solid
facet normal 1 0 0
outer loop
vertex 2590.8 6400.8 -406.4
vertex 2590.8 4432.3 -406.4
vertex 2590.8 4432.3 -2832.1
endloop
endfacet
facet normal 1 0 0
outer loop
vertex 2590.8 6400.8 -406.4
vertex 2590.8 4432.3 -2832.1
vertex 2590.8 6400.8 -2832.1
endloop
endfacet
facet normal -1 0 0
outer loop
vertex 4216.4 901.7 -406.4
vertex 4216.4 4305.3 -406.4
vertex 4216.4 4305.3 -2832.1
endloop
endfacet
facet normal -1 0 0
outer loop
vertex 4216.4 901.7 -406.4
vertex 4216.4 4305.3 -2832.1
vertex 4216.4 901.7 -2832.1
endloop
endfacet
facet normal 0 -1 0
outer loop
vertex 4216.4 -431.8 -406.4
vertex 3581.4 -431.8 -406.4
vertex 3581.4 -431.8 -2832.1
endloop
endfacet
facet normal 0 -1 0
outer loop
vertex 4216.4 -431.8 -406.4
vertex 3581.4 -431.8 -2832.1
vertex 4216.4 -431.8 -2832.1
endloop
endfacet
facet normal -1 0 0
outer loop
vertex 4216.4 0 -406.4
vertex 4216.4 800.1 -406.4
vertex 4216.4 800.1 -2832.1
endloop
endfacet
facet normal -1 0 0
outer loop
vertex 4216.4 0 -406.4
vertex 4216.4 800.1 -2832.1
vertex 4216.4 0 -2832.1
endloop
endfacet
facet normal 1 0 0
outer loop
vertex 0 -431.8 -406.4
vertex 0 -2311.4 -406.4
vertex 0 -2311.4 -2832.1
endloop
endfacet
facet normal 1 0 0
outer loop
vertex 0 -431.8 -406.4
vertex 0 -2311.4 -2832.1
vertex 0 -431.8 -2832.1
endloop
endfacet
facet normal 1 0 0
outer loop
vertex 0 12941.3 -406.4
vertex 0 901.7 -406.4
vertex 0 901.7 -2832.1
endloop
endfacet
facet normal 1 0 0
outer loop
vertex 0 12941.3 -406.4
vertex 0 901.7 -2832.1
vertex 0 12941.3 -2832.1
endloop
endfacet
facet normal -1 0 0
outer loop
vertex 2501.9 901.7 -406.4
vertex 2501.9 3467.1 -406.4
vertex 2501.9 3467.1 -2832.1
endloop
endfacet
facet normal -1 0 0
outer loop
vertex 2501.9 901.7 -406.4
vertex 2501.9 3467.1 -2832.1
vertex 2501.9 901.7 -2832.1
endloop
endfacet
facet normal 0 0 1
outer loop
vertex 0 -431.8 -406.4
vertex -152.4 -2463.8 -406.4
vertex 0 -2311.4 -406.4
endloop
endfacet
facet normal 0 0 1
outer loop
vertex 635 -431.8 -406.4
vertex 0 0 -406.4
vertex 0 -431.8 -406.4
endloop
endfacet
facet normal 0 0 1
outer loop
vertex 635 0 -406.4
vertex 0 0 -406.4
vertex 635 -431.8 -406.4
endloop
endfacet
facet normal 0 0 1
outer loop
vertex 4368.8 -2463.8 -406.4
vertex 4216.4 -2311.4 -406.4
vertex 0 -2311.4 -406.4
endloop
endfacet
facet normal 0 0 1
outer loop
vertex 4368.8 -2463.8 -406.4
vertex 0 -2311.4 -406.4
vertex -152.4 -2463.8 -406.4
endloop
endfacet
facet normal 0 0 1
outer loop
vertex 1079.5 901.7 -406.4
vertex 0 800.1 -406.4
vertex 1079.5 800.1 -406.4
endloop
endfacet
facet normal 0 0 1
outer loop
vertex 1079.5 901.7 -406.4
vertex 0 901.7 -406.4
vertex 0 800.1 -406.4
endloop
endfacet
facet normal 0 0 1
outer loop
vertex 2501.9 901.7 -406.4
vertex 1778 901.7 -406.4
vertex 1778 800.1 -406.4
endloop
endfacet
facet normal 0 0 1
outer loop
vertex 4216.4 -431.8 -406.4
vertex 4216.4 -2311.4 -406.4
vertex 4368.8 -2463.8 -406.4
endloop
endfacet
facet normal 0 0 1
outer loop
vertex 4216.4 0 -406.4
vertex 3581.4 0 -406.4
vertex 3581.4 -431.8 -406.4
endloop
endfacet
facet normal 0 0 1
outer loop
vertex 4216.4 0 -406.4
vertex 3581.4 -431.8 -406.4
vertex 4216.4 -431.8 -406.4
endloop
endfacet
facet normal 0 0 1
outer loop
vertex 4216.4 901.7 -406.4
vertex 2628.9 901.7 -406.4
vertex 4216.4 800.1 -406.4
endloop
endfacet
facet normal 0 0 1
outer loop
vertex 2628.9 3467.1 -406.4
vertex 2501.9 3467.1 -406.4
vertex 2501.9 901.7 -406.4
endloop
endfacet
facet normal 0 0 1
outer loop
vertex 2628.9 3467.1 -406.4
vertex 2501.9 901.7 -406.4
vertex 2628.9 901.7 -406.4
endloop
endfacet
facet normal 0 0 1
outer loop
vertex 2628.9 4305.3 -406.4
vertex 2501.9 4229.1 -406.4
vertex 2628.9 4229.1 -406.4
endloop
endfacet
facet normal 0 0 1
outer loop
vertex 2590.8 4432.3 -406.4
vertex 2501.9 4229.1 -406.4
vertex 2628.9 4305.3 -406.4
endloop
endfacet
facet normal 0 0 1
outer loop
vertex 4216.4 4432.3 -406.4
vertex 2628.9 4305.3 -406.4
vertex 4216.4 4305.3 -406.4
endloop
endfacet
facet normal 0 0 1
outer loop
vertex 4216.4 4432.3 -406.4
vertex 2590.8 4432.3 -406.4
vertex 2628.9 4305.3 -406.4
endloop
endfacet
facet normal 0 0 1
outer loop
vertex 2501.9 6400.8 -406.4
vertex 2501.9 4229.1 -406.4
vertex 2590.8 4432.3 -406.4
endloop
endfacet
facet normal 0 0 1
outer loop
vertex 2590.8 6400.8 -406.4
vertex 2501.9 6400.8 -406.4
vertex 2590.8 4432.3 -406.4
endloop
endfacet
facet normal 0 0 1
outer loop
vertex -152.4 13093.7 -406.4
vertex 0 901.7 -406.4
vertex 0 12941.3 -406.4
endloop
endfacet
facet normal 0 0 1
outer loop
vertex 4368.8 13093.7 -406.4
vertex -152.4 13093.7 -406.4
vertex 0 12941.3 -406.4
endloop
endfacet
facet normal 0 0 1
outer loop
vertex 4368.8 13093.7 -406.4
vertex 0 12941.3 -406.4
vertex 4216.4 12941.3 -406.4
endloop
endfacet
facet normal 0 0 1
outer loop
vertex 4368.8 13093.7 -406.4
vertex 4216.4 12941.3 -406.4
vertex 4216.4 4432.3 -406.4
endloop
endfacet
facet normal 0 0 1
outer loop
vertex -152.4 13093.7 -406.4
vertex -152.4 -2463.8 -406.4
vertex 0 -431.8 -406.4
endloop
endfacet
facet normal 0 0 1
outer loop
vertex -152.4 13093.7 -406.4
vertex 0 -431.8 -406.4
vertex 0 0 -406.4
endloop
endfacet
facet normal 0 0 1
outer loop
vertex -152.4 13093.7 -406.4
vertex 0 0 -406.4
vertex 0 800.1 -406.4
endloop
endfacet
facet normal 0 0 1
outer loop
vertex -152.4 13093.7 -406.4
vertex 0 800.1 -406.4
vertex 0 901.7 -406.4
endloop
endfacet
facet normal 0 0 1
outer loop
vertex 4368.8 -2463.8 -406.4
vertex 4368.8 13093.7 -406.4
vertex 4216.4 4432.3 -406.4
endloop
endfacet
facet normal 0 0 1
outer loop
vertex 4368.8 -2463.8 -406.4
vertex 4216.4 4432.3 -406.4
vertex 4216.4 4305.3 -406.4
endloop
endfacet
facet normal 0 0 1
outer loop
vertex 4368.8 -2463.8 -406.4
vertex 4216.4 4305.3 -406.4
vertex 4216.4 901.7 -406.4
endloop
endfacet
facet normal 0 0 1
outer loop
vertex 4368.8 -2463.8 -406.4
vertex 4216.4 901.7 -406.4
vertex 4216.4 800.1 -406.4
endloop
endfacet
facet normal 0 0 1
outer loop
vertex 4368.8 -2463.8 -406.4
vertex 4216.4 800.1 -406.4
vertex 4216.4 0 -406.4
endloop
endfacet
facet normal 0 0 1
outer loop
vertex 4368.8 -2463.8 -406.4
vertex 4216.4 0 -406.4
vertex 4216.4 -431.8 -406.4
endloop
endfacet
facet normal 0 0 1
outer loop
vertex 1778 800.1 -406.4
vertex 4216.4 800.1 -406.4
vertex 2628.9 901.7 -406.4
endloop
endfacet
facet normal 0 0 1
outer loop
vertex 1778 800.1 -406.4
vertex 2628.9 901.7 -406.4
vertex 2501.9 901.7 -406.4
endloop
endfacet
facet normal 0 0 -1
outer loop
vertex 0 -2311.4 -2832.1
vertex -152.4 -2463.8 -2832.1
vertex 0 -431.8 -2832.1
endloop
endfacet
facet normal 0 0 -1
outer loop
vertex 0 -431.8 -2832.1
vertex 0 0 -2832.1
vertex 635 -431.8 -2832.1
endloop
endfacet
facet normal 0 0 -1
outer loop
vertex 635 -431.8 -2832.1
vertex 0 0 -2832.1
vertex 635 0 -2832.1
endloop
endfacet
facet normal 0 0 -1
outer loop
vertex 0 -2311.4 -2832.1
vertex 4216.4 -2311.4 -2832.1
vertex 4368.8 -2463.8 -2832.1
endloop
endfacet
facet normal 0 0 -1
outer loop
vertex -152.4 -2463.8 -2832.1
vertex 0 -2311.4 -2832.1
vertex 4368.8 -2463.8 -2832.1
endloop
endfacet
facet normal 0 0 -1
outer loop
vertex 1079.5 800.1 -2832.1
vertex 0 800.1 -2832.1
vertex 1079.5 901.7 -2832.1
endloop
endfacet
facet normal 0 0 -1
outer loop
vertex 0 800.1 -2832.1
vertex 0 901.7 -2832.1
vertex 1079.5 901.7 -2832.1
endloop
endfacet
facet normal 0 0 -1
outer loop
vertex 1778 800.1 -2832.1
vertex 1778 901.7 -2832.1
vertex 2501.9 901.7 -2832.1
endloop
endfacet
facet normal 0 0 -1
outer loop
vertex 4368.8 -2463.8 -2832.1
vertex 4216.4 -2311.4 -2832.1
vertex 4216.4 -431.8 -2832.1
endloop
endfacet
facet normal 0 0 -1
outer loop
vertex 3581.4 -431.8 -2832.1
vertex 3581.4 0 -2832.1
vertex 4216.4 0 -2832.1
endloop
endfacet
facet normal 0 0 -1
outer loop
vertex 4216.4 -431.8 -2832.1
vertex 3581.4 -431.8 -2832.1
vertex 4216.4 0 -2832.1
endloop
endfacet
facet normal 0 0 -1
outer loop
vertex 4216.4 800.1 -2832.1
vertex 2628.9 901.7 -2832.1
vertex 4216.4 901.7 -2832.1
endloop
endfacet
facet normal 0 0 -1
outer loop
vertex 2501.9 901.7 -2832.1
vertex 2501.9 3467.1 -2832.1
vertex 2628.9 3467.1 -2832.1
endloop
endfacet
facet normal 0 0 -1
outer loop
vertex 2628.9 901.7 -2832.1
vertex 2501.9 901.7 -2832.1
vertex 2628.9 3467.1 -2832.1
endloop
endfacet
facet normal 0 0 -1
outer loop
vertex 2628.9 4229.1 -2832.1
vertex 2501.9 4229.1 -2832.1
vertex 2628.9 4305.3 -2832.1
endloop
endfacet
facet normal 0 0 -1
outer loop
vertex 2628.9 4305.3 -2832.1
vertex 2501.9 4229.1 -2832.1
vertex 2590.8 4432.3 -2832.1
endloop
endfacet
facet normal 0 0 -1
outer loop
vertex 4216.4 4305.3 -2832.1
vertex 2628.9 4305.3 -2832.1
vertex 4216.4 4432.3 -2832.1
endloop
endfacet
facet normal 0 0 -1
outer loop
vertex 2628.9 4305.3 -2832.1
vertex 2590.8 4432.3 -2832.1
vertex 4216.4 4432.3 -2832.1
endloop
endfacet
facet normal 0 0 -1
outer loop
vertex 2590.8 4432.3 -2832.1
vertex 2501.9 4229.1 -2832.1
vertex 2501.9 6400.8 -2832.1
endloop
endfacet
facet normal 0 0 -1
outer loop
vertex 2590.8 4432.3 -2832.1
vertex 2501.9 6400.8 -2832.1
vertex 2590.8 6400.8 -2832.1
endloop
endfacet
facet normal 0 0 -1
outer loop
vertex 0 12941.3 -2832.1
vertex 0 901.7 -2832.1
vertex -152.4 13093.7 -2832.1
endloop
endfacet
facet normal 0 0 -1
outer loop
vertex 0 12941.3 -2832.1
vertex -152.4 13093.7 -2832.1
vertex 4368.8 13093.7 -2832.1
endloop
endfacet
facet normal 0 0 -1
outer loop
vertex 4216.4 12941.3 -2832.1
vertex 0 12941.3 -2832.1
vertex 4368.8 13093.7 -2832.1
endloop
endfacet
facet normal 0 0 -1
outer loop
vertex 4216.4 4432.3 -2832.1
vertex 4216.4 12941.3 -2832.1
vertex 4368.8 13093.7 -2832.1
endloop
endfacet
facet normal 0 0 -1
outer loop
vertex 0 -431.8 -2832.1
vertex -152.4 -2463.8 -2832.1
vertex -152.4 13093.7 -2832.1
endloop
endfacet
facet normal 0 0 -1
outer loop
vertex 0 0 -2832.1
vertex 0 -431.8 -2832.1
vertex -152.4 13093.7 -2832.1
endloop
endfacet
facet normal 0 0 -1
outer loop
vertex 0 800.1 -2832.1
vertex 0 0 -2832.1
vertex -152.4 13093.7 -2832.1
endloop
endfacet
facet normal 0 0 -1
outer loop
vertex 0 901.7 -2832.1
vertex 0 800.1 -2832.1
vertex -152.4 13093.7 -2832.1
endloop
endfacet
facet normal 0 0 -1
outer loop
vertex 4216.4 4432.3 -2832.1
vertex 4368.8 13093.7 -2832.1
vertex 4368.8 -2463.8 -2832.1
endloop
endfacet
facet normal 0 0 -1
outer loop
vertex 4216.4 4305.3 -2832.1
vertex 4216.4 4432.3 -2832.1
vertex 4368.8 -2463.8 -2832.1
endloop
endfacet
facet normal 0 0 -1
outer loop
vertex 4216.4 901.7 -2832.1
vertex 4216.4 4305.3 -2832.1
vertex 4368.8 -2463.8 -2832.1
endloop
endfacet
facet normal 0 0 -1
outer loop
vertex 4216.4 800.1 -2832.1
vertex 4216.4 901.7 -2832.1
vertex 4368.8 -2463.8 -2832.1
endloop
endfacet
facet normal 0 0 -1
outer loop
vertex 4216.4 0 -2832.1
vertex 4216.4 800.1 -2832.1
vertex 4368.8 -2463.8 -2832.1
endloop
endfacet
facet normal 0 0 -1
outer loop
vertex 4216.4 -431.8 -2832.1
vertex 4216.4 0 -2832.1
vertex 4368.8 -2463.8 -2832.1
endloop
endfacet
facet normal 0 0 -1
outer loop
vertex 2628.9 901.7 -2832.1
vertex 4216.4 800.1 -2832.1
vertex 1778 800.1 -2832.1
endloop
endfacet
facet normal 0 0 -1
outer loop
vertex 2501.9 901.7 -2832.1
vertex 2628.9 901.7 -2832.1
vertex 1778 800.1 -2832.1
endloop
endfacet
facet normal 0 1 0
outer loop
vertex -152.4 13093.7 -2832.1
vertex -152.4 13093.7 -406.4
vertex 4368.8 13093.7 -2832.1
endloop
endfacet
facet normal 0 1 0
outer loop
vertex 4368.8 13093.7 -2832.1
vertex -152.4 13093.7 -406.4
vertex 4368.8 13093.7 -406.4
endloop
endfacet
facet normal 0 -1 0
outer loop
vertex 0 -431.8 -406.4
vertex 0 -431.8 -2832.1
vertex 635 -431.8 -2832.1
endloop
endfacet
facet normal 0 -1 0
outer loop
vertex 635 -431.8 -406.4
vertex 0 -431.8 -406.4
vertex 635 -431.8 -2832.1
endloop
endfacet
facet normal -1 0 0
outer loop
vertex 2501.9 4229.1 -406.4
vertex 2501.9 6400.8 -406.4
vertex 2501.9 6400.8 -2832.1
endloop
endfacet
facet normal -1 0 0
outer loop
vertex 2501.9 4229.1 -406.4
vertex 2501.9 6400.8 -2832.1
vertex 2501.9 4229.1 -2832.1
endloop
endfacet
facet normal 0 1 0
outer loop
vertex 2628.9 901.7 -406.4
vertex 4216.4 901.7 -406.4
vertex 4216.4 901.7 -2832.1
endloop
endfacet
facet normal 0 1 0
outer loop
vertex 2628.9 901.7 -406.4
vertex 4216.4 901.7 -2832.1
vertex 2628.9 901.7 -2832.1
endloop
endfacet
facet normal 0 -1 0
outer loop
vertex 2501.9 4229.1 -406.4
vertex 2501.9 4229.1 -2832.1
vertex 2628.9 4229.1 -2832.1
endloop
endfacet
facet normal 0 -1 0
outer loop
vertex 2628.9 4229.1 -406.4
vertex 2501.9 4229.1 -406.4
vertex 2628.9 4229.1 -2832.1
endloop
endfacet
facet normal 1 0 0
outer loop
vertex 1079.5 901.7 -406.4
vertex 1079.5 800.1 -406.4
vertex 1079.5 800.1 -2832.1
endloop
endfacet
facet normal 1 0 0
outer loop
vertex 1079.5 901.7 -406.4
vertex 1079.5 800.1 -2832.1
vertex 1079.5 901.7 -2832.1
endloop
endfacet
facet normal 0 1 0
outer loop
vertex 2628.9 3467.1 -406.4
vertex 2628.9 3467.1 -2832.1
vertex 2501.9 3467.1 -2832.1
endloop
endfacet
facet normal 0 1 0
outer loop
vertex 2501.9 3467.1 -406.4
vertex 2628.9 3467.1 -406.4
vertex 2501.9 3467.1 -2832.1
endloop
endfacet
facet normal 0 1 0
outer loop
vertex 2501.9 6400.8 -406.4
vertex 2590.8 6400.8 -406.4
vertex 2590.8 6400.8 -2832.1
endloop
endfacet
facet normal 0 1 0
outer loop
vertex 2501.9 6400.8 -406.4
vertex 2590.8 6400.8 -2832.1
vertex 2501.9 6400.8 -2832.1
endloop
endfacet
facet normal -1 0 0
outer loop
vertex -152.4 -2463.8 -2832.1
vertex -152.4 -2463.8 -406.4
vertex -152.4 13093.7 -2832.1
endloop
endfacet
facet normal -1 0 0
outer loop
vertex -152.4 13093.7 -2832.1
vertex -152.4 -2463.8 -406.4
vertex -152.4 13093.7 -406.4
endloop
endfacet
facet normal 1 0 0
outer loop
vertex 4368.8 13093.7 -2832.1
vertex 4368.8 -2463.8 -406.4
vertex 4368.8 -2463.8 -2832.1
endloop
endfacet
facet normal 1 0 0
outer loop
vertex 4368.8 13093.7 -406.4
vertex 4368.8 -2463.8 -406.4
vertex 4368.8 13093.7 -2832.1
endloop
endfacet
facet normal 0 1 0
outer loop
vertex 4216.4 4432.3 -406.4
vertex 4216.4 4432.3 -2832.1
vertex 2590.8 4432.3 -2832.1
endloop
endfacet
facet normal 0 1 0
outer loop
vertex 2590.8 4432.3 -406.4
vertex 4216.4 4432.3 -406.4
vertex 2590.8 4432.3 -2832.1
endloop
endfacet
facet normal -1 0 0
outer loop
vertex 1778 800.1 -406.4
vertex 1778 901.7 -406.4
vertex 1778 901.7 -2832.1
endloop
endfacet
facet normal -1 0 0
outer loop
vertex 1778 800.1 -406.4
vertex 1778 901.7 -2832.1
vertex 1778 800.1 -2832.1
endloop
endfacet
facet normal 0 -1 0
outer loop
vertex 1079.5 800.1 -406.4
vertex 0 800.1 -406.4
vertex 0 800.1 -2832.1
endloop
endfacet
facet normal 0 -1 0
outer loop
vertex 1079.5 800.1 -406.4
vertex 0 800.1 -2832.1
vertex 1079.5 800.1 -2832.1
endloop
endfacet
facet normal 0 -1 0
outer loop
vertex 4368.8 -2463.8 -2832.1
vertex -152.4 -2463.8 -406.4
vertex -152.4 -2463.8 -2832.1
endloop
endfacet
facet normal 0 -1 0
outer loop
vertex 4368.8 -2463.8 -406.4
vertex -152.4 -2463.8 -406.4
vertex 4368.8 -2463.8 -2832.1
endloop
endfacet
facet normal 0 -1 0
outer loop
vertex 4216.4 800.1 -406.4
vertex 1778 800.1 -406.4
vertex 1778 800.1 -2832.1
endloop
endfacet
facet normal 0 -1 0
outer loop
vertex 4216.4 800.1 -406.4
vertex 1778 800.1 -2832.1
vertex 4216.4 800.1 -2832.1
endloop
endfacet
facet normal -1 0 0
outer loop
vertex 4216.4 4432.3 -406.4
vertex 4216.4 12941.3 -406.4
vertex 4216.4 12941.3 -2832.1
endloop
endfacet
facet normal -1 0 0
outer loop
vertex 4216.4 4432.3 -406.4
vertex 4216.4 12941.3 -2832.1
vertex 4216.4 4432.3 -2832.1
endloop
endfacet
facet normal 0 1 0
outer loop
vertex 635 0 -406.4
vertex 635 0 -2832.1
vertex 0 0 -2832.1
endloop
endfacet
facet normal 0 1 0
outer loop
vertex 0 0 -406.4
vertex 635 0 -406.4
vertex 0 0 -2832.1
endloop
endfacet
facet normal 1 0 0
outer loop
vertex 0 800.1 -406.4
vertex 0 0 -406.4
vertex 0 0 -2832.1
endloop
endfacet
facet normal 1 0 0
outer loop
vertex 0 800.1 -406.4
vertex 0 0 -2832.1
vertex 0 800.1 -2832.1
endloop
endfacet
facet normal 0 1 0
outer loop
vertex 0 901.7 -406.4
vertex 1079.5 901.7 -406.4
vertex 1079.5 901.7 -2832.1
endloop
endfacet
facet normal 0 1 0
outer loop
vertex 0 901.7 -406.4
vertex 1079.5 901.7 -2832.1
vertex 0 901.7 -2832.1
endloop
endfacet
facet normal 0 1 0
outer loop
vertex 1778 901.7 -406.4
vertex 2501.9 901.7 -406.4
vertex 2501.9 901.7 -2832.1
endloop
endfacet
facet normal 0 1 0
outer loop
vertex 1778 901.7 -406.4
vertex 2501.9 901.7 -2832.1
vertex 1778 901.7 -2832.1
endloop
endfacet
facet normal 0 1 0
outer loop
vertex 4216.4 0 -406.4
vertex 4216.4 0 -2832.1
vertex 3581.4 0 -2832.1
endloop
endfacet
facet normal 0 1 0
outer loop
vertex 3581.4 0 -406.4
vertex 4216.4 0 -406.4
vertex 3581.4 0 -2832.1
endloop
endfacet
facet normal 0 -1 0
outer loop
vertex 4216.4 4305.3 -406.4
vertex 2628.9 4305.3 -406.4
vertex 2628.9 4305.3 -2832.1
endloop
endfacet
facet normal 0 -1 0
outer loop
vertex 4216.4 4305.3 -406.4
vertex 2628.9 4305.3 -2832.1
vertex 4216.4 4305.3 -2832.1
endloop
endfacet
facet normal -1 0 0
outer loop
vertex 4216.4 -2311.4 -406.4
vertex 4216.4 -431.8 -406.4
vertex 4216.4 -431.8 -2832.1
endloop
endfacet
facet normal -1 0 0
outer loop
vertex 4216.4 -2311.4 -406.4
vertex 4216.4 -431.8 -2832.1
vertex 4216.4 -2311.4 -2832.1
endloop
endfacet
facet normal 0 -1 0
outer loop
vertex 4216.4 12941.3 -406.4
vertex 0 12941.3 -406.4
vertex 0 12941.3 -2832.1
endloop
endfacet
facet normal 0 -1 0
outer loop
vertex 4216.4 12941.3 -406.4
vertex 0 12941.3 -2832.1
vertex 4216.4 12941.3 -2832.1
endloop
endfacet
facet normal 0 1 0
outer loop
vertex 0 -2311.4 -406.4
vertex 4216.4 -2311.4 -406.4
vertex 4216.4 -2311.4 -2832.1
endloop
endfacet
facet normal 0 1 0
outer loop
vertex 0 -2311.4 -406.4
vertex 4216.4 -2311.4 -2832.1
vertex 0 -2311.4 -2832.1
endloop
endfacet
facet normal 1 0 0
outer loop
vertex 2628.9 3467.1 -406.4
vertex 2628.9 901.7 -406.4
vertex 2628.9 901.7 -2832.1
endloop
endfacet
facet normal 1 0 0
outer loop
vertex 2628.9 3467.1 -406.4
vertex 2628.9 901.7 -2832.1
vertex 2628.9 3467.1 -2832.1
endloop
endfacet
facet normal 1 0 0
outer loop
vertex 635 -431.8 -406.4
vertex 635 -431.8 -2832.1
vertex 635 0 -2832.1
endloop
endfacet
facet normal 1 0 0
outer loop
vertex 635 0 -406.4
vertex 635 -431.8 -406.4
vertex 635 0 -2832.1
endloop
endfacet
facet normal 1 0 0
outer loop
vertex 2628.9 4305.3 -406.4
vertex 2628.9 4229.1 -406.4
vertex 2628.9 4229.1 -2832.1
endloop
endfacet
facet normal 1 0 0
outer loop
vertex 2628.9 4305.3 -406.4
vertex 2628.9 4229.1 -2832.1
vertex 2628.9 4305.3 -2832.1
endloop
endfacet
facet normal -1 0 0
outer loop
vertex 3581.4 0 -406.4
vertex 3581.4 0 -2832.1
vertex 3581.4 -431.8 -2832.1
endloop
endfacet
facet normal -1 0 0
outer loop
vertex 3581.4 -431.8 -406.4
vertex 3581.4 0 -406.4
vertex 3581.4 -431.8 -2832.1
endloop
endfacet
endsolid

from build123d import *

# Parameters (mm, degrees)
F1_W     = 4521.2
F1_H     = 15557.5
F2_DEPTH = 2425.7


# Not quite as in the source:
# - a feature names something its author has since deleted; it is built from what else it names


with BuildPart() as f2:
    # F1 (on offset) → F2 (new body)
    with BuildSketch(Plane.XY.offset(-406.4)):
        with Locations((2108.2, 5314.95)):
            Rectangle(F1_W, F1_H)
        Polygon((635, 0), (0, 0), (0, 800.1), (1079.5, 800.1), (1079.5, 901.7), (0, 901.7), (0, 12941.3), (4216.4, 12941.3), (4216.4, 4432.3), (2590.8, 4432.3), (2590.8, 6400.8), (2501.9, 6400.8), (2501.9, 4229.1), (2628.9, 4229.1), (2628.9, 4305.3), (4216.4, 4305.3), (4216.4, 901.7), (2628.9, 901.7), (2628.9, 3467.1), (2501.9, 3467.1), (2501.9, 901.7), (1778, 901.7), (1778, 800.1), (4216.4, 800.1), (4216.4, 0), (3581.4, 0), (3581.4, -431.8), (4216.4, -431.8), (4216.4, -2311.4), (0, -2311.4), (0, -431.8), (635, -431.8), align=None, mode=Mode.SUBTRACT)
    extrude(amount=-F2_DEPTH)


solid = f2.part
